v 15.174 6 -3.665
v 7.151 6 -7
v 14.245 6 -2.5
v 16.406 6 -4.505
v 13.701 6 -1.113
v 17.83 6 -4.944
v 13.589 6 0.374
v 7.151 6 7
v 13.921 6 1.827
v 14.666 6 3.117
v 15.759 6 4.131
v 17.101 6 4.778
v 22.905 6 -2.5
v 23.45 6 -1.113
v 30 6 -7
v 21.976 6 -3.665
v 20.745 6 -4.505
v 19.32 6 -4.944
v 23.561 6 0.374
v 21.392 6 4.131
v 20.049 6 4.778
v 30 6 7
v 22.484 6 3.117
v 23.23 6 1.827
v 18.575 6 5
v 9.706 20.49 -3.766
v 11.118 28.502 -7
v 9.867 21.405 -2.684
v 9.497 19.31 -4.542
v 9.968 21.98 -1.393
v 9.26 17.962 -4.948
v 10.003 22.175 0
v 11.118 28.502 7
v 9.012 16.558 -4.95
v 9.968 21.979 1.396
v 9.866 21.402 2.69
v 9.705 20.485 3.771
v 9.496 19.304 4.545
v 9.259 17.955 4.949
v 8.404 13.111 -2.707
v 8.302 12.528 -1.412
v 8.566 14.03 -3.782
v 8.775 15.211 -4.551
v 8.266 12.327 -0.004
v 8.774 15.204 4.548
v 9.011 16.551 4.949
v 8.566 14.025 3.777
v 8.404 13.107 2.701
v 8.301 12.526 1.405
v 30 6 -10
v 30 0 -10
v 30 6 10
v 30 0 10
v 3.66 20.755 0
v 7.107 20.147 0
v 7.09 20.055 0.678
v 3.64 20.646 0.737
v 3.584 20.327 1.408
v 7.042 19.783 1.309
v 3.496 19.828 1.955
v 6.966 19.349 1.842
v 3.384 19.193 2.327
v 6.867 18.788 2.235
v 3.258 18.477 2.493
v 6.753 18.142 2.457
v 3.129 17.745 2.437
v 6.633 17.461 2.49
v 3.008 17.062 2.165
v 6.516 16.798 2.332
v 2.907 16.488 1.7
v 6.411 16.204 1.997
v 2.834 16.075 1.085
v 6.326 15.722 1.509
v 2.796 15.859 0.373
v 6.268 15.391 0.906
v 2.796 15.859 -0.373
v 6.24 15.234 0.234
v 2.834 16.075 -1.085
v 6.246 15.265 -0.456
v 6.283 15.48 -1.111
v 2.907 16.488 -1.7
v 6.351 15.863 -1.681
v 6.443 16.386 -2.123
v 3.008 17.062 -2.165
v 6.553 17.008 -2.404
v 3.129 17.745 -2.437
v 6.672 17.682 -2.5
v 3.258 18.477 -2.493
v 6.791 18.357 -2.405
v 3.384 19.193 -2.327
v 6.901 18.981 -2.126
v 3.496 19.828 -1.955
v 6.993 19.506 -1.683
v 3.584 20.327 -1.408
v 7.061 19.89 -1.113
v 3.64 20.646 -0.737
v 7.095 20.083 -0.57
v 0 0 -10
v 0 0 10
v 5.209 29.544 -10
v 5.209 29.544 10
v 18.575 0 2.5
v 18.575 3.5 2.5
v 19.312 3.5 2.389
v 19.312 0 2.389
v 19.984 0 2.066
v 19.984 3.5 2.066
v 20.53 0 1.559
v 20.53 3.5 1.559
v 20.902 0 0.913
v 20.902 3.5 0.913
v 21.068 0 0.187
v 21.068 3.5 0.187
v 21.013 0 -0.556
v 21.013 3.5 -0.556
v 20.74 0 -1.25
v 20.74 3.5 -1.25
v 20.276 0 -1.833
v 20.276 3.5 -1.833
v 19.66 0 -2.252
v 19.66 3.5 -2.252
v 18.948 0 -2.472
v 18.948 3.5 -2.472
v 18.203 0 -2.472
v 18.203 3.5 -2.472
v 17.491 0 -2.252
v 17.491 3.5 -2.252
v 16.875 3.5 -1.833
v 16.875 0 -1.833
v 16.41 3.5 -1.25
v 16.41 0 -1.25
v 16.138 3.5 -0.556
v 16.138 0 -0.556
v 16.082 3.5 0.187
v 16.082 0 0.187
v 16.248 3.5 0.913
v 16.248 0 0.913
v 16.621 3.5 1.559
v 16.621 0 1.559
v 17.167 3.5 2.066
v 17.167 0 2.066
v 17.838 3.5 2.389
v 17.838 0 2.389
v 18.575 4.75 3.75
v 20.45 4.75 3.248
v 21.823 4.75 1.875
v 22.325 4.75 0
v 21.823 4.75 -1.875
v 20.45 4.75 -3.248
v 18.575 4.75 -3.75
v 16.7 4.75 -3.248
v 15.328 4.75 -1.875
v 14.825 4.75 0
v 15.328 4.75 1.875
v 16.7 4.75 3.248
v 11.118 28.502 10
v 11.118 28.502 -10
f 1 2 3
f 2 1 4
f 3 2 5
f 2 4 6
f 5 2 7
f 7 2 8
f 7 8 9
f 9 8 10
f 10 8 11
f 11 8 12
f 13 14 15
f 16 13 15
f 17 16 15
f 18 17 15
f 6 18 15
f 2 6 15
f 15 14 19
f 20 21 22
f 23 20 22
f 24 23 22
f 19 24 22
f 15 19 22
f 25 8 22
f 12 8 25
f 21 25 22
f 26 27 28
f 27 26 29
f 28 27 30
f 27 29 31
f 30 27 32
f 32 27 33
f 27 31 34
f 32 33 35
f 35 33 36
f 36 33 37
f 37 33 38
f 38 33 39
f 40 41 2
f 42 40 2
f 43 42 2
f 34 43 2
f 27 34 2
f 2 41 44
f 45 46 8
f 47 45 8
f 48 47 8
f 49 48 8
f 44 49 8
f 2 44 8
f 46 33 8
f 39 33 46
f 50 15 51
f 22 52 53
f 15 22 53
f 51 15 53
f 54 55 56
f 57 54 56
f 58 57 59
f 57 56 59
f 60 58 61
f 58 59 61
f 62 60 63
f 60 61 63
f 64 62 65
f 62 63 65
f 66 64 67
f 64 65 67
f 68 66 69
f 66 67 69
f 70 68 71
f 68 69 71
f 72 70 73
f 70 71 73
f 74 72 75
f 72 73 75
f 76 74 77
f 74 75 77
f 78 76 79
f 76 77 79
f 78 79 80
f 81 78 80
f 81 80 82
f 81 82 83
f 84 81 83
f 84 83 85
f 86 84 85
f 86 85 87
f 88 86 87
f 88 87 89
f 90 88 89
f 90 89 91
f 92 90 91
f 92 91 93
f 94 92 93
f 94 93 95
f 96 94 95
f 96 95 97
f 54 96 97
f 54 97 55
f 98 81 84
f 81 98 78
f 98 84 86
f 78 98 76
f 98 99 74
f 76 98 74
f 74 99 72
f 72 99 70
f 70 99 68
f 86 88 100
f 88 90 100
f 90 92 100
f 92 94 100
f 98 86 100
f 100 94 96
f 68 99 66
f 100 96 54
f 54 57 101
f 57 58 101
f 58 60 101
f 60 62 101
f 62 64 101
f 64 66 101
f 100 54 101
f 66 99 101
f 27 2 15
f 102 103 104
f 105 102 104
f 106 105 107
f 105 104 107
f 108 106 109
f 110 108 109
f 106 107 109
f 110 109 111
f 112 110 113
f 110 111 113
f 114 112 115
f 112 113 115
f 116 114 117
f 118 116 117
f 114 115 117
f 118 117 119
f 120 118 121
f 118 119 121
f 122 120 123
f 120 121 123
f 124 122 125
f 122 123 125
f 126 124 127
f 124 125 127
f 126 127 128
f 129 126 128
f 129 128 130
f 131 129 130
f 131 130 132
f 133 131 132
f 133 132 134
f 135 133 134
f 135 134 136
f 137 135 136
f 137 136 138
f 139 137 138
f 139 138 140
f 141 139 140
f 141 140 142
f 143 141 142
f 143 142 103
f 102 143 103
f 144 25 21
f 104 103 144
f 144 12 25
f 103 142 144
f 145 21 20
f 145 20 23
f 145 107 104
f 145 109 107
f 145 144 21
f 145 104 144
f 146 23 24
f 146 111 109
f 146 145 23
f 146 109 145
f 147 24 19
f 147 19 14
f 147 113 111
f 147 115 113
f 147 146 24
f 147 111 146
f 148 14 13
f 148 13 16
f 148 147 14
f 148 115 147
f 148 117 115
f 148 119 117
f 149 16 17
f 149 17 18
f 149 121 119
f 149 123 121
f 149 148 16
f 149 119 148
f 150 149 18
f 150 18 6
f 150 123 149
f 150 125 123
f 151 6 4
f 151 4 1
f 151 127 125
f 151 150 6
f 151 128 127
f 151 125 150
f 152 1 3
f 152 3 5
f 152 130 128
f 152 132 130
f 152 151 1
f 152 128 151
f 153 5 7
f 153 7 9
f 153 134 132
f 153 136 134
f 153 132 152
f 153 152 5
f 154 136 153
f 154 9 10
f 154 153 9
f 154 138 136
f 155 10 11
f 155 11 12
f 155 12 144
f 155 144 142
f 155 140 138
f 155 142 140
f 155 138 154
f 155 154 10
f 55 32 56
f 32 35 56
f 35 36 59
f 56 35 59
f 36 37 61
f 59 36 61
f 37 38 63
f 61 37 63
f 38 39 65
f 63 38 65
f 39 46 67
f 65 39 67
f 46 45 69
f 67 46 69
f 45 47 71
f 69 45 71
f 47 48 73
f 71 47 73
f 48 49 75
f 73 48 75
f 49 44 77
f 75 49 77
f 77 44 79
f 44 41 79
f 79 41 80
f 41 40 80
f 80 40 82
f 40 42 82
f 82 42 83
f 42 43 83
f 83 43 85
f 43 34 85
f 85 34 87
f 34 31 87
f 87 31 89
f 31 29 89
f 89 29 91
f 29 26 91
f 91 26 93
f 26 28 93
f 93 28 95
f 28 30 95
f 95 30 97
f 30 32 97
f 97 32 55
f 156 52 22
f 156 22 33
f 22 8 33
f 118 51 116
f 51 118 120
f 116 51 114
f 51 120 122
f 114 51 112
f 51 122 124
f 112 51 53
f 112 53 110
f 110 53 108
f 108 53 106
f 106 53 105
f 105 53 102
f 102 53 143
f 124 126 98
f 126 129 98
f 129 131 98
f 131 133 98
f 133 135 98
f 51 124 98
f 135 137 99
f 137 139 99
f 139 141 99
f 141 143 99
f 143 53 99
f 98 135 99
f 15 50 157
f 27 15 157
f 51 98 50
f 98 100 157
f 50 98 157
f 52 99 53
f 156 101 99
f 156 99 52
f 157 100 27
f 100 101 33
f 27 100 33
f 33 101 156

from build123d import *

# Parameters (mm, degrees)
BOSS_EXTRUDE1_DEPTH = 10
BOSS_EXTRUDE2_DEPTH = 3
SKETCH3_R           = 2.5
CUT_EXTRUDE1_DEPTH  = 41.198190433
SKETCH4_R           = 2.5
CUT_EXTRUDE2_DEPTH  = 40.425003339
CHAMFER1_SIZE       = 2.5


with BuildPart() as part:
    # Sketch1 → Boss-Extrude1 (new, symmetric)
    with BuildSketch(Plane.XY):
        Polygon((0, 0), (5.20944533, 29.54423259), (11.118291848, 28.502343524), (7.150521556, 6), (30, 6), (30, 0), align=None)
    extrude(amount=BOSS_EXTRUDE1_DEPTH, both=True)

    # Sketch2 → Boss-Extrude2 (add)
    with BuildSketch(Plane.XY.offset(10)):
        Polygon((11.118291848, 28.502343524), (7.150521556, 6), (30, 6), align=None)
    boss_extrude2 = extrude(amount=-BOSS_EXTRUDE2_DEPTH)

    # Mirror1: Boss-Extrude2 across plane
    add(boss_extrude2.mirror(Plane.XY))

    # Sketch3 → Cut-Extrude1 (cut, through all)
    with BuildSketch(Plane(origin=(5.908846518, -1.041889066, 0), x_dir=(0, 0, -1), z_dir=(0.9848077530122076, -0.173648177666934, 0))):
        with Locations(Location((0, 18.575260778, 0), (0, 0, 90))):
            Circle(SKETCH3_R)
    extrude(amount=-CUT_EXTRUDE1_DEPTH, mode=Mode.SUBTRACT)

    # Sketch4 → Cut-Extrude2 (cut, through all)
    with BuildSketch(Plane(origin=(0, 6, 0), x_dir=(1, 0, 0), z_dir=(0, 1, 0))):
        with Locations(Location((18.575260778, 0, 0), (0, 0, 270))):
            Circle(SKETCH4_R)
    extrude(amount=-CUT_EXTRUDE2_DEPTH, mode=Mode.SUBTRACT)

    # Chamfer1
    chamfer1_edges = [part.edges().sort_by_distance(p)[0] for p in [
        (8.700286258, 14.78915238, 0),
        (18.575260778, 6, -2.5),
    ]]
    chamfer(chamfer1_edges, length=CHAMFER1_SIZE)


solid = part.part
